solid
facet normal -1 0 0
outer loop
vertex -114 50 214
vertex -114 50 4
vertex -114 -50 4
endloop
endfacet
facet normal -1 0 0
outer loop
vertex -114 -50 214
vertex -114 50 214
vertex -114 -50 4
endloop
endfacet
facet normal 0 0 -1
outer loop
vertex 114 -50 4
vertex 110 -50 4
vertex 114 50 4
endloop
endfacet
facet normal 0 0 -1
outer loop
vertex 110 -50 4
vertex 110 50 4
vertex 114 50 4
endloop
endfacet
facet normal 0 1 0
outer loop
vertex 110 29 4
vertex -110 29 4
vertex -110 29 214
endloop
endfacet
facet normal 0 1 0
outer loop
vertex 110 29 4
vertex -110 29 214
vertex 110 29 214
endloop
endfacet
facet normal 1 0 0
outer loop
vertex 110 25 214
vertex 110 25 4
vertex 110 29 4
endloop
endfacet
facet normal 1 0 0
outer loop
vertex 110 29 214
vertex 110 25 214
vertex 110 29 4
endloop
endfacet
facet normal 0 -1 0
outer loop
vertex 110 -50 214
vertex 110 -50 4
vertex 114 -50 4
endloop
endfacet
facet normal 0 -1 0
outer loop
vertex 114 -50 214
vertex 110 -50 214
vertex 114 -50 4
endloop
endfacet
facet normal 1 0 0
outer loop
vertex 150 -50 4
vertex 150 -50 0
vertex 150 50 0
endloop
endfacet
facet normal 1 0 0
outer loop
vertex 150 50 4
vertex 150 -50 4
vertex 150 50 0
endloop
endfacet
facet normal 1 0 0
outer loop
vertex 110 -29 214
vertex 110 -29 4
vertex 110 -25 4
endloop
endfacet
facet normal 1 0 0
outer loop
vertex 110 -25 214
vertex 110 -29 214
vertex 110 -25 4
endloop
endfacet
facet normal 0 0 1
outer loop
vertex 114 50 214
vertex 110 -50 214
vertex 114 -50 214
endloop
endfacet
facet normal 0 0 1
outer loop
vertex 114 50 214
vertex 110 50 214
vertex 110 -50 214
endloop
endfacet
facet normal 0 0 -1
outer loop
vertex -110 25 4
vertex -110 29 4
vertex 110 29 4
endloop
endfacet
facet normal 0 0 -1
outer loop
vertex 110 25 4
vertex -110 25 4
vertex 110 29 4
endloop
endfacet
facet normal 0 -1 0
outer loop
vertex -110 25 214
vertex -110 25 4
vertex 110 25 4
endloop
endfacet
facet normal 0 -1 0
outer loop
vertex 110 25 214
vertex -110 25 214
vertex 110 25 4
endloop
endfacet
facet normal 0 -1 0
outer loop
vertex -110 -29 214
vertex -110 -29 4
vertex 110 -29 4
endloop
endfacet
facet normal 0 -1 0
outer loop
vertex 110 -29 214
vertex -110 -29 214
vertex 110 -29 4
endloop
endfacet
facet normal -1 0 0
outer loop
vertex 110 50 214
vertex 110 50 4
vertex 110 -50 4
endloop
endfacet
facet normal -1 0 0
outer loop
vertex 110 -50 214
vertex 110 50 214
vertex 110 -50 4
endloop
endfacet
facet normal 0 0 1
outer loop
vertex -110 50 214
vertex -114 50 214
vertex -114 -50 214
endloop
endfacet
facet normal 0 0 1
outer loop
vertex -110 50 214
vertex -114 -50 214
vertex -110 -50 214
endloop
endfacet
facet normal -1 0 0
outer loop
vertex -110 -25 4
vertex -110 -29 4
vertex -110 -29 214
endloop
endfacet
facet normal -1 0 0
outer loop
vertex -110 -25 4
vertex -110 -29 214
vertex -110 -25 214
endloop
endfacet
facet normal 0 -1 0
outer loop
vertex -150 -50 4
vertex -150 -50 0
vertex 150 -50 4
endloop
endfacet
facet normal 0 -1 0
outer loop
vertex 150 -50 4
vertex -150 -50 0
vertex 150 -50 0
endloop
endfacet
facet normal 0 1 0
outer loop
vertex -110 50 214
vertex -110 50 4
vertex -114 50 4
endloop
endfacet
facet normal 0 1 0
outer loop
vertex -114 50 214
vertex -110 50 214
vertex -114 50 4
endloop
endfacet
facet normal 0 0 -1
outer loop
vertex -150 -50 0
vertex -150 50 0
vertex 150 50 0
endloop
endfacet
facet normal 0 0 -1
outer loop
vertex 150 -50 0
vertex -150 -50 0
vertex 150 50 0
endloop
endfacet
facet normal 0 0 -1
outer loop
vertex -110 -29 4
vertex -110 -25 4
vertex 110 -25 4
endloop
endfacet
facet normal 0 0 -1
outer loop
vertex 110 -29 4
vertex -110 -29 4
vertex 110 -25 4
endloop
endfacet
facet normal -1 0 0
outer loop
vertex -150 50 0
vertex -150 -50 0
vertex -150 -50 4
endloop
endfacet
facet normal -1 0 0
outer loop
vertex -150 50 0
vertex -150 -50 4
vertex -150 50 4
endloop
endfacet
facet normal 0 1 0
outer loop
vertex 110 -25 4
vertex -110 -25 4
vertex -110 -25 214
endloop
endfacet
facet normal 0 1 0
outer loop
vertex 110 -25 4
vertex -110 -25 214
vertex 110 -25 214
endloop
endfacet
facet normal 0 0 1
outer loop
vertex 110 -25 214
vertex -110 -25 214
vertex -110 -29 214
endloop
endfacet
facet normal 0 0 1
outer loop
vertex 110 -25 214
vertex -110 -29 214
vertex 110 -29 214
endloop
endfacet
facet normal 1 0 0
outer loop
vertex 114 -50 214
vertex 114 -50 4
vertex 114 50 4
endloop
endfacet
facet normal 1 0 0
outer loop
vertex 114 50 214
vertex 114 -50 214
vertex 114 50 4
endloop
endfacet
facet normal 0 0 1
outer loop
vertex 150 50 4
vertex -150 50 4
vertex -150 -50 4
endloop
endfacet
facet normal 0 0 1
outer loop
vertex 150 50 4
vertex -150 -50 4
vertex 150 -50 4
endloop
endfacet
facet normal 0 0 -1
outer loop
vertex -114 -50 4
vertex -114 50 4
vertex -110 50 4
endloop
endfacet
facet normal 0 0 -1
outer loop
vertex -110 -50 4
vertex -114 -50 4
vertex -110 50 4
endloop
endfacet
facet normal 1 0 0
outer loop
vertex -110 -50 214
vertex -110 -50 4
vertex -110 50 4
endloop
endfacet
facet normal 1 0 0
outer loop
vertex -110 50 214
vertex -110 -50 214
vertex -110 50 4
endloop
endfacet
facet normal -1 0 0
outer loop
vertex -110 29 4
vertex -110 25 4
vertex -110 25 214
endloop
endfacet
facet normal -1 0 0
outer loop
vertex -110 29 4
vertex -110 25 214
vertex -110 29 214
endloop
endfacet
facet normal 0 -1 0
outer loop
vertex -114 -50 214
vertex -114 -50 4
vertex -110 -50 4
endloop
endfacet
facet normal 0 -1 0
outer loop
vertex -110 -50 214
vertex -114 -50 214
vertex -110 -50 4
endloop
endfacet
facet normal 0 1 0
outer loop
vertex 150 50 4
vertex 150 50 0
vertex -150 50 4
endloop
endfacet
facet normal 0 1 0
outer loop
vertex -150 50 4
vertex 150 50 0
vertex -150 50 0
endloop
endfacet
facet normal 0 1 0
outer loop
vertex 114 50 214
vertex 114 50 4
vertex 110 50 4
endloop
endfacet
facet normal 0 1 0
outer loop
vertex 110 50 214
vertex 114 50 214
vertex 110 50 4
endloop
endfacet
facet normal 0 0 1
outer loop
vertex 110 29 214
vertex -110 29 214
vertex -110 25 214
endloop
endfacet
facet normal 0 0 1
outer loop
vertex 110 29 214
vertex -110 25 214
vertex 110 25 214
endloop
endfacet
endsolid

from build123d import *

# Parameters (mm, degrees)
F0_W     = 200
F0_H     = 100
F0_W_2   = 50
F3_DEPTH = 4
F5_DEPTH = 210
F4_W     = 220
F4_H     = 4
F6_DEPTH = 210
F7_DEPTH = 210
F8_DEPTH = 210


with BuildPart() as f3:
    # F0 (on Top) → F3 (new body)
    with BuildSketch(Plane.XY):
        Rectangle(F0_W, F0_H)
        with Locations((125, 0)):
            Rectangle(F0_W_2, F0_H)
        with Locations((-125, 0)):
            Rectangle(F0_W_2, F0_H)
    extrude(amount=F3_DEPTH)


with BuildPart() as f5:
    # F4 (on face) → F5 (new body)
    with BuildSketch(Plane.XY.offset(4)):
        Polygon((110, 25), (110, -25), (110, -29), (110, -50), (114, -50), (114, 50), (110, 50), (110, 29), align=None)
    extrude(amount=F5_DEPTH)


with BuildPart() as f6:
    # F4 (on face) → F6 (new body)
    with BuildSketch(Plane.XY.offset(4)):
        with Locations((0, -27)):
            Rectangle(F4_W, F4_H)
    extrude(amount=F6_DEPTH)


with BuildPart() as f7:
    # F4 (on face) → F7 (new body)
    with BuildSketch(Plane.XY.offset(4)):
        with Locations((0, 27)):
            Rectangle(F4_W, F4_H)
    extrude(amount=F7_DEPTH)


with BuildPart() as f8:
    # F4 (on face) → F8 (new body)
    with BuildSketch(Plane.XY.offset(4)):
        Polygon((-110, -29), (-110, -25), (-110, 25), (-110, 29), (-110, 50), (-114, 50), (-114, -50), (-110, -50), align=None)
    extrude(amount=F8_DEPTH)


solid = Compound([f3.part, f5.part, f6.part, f7.part, f8.part])
